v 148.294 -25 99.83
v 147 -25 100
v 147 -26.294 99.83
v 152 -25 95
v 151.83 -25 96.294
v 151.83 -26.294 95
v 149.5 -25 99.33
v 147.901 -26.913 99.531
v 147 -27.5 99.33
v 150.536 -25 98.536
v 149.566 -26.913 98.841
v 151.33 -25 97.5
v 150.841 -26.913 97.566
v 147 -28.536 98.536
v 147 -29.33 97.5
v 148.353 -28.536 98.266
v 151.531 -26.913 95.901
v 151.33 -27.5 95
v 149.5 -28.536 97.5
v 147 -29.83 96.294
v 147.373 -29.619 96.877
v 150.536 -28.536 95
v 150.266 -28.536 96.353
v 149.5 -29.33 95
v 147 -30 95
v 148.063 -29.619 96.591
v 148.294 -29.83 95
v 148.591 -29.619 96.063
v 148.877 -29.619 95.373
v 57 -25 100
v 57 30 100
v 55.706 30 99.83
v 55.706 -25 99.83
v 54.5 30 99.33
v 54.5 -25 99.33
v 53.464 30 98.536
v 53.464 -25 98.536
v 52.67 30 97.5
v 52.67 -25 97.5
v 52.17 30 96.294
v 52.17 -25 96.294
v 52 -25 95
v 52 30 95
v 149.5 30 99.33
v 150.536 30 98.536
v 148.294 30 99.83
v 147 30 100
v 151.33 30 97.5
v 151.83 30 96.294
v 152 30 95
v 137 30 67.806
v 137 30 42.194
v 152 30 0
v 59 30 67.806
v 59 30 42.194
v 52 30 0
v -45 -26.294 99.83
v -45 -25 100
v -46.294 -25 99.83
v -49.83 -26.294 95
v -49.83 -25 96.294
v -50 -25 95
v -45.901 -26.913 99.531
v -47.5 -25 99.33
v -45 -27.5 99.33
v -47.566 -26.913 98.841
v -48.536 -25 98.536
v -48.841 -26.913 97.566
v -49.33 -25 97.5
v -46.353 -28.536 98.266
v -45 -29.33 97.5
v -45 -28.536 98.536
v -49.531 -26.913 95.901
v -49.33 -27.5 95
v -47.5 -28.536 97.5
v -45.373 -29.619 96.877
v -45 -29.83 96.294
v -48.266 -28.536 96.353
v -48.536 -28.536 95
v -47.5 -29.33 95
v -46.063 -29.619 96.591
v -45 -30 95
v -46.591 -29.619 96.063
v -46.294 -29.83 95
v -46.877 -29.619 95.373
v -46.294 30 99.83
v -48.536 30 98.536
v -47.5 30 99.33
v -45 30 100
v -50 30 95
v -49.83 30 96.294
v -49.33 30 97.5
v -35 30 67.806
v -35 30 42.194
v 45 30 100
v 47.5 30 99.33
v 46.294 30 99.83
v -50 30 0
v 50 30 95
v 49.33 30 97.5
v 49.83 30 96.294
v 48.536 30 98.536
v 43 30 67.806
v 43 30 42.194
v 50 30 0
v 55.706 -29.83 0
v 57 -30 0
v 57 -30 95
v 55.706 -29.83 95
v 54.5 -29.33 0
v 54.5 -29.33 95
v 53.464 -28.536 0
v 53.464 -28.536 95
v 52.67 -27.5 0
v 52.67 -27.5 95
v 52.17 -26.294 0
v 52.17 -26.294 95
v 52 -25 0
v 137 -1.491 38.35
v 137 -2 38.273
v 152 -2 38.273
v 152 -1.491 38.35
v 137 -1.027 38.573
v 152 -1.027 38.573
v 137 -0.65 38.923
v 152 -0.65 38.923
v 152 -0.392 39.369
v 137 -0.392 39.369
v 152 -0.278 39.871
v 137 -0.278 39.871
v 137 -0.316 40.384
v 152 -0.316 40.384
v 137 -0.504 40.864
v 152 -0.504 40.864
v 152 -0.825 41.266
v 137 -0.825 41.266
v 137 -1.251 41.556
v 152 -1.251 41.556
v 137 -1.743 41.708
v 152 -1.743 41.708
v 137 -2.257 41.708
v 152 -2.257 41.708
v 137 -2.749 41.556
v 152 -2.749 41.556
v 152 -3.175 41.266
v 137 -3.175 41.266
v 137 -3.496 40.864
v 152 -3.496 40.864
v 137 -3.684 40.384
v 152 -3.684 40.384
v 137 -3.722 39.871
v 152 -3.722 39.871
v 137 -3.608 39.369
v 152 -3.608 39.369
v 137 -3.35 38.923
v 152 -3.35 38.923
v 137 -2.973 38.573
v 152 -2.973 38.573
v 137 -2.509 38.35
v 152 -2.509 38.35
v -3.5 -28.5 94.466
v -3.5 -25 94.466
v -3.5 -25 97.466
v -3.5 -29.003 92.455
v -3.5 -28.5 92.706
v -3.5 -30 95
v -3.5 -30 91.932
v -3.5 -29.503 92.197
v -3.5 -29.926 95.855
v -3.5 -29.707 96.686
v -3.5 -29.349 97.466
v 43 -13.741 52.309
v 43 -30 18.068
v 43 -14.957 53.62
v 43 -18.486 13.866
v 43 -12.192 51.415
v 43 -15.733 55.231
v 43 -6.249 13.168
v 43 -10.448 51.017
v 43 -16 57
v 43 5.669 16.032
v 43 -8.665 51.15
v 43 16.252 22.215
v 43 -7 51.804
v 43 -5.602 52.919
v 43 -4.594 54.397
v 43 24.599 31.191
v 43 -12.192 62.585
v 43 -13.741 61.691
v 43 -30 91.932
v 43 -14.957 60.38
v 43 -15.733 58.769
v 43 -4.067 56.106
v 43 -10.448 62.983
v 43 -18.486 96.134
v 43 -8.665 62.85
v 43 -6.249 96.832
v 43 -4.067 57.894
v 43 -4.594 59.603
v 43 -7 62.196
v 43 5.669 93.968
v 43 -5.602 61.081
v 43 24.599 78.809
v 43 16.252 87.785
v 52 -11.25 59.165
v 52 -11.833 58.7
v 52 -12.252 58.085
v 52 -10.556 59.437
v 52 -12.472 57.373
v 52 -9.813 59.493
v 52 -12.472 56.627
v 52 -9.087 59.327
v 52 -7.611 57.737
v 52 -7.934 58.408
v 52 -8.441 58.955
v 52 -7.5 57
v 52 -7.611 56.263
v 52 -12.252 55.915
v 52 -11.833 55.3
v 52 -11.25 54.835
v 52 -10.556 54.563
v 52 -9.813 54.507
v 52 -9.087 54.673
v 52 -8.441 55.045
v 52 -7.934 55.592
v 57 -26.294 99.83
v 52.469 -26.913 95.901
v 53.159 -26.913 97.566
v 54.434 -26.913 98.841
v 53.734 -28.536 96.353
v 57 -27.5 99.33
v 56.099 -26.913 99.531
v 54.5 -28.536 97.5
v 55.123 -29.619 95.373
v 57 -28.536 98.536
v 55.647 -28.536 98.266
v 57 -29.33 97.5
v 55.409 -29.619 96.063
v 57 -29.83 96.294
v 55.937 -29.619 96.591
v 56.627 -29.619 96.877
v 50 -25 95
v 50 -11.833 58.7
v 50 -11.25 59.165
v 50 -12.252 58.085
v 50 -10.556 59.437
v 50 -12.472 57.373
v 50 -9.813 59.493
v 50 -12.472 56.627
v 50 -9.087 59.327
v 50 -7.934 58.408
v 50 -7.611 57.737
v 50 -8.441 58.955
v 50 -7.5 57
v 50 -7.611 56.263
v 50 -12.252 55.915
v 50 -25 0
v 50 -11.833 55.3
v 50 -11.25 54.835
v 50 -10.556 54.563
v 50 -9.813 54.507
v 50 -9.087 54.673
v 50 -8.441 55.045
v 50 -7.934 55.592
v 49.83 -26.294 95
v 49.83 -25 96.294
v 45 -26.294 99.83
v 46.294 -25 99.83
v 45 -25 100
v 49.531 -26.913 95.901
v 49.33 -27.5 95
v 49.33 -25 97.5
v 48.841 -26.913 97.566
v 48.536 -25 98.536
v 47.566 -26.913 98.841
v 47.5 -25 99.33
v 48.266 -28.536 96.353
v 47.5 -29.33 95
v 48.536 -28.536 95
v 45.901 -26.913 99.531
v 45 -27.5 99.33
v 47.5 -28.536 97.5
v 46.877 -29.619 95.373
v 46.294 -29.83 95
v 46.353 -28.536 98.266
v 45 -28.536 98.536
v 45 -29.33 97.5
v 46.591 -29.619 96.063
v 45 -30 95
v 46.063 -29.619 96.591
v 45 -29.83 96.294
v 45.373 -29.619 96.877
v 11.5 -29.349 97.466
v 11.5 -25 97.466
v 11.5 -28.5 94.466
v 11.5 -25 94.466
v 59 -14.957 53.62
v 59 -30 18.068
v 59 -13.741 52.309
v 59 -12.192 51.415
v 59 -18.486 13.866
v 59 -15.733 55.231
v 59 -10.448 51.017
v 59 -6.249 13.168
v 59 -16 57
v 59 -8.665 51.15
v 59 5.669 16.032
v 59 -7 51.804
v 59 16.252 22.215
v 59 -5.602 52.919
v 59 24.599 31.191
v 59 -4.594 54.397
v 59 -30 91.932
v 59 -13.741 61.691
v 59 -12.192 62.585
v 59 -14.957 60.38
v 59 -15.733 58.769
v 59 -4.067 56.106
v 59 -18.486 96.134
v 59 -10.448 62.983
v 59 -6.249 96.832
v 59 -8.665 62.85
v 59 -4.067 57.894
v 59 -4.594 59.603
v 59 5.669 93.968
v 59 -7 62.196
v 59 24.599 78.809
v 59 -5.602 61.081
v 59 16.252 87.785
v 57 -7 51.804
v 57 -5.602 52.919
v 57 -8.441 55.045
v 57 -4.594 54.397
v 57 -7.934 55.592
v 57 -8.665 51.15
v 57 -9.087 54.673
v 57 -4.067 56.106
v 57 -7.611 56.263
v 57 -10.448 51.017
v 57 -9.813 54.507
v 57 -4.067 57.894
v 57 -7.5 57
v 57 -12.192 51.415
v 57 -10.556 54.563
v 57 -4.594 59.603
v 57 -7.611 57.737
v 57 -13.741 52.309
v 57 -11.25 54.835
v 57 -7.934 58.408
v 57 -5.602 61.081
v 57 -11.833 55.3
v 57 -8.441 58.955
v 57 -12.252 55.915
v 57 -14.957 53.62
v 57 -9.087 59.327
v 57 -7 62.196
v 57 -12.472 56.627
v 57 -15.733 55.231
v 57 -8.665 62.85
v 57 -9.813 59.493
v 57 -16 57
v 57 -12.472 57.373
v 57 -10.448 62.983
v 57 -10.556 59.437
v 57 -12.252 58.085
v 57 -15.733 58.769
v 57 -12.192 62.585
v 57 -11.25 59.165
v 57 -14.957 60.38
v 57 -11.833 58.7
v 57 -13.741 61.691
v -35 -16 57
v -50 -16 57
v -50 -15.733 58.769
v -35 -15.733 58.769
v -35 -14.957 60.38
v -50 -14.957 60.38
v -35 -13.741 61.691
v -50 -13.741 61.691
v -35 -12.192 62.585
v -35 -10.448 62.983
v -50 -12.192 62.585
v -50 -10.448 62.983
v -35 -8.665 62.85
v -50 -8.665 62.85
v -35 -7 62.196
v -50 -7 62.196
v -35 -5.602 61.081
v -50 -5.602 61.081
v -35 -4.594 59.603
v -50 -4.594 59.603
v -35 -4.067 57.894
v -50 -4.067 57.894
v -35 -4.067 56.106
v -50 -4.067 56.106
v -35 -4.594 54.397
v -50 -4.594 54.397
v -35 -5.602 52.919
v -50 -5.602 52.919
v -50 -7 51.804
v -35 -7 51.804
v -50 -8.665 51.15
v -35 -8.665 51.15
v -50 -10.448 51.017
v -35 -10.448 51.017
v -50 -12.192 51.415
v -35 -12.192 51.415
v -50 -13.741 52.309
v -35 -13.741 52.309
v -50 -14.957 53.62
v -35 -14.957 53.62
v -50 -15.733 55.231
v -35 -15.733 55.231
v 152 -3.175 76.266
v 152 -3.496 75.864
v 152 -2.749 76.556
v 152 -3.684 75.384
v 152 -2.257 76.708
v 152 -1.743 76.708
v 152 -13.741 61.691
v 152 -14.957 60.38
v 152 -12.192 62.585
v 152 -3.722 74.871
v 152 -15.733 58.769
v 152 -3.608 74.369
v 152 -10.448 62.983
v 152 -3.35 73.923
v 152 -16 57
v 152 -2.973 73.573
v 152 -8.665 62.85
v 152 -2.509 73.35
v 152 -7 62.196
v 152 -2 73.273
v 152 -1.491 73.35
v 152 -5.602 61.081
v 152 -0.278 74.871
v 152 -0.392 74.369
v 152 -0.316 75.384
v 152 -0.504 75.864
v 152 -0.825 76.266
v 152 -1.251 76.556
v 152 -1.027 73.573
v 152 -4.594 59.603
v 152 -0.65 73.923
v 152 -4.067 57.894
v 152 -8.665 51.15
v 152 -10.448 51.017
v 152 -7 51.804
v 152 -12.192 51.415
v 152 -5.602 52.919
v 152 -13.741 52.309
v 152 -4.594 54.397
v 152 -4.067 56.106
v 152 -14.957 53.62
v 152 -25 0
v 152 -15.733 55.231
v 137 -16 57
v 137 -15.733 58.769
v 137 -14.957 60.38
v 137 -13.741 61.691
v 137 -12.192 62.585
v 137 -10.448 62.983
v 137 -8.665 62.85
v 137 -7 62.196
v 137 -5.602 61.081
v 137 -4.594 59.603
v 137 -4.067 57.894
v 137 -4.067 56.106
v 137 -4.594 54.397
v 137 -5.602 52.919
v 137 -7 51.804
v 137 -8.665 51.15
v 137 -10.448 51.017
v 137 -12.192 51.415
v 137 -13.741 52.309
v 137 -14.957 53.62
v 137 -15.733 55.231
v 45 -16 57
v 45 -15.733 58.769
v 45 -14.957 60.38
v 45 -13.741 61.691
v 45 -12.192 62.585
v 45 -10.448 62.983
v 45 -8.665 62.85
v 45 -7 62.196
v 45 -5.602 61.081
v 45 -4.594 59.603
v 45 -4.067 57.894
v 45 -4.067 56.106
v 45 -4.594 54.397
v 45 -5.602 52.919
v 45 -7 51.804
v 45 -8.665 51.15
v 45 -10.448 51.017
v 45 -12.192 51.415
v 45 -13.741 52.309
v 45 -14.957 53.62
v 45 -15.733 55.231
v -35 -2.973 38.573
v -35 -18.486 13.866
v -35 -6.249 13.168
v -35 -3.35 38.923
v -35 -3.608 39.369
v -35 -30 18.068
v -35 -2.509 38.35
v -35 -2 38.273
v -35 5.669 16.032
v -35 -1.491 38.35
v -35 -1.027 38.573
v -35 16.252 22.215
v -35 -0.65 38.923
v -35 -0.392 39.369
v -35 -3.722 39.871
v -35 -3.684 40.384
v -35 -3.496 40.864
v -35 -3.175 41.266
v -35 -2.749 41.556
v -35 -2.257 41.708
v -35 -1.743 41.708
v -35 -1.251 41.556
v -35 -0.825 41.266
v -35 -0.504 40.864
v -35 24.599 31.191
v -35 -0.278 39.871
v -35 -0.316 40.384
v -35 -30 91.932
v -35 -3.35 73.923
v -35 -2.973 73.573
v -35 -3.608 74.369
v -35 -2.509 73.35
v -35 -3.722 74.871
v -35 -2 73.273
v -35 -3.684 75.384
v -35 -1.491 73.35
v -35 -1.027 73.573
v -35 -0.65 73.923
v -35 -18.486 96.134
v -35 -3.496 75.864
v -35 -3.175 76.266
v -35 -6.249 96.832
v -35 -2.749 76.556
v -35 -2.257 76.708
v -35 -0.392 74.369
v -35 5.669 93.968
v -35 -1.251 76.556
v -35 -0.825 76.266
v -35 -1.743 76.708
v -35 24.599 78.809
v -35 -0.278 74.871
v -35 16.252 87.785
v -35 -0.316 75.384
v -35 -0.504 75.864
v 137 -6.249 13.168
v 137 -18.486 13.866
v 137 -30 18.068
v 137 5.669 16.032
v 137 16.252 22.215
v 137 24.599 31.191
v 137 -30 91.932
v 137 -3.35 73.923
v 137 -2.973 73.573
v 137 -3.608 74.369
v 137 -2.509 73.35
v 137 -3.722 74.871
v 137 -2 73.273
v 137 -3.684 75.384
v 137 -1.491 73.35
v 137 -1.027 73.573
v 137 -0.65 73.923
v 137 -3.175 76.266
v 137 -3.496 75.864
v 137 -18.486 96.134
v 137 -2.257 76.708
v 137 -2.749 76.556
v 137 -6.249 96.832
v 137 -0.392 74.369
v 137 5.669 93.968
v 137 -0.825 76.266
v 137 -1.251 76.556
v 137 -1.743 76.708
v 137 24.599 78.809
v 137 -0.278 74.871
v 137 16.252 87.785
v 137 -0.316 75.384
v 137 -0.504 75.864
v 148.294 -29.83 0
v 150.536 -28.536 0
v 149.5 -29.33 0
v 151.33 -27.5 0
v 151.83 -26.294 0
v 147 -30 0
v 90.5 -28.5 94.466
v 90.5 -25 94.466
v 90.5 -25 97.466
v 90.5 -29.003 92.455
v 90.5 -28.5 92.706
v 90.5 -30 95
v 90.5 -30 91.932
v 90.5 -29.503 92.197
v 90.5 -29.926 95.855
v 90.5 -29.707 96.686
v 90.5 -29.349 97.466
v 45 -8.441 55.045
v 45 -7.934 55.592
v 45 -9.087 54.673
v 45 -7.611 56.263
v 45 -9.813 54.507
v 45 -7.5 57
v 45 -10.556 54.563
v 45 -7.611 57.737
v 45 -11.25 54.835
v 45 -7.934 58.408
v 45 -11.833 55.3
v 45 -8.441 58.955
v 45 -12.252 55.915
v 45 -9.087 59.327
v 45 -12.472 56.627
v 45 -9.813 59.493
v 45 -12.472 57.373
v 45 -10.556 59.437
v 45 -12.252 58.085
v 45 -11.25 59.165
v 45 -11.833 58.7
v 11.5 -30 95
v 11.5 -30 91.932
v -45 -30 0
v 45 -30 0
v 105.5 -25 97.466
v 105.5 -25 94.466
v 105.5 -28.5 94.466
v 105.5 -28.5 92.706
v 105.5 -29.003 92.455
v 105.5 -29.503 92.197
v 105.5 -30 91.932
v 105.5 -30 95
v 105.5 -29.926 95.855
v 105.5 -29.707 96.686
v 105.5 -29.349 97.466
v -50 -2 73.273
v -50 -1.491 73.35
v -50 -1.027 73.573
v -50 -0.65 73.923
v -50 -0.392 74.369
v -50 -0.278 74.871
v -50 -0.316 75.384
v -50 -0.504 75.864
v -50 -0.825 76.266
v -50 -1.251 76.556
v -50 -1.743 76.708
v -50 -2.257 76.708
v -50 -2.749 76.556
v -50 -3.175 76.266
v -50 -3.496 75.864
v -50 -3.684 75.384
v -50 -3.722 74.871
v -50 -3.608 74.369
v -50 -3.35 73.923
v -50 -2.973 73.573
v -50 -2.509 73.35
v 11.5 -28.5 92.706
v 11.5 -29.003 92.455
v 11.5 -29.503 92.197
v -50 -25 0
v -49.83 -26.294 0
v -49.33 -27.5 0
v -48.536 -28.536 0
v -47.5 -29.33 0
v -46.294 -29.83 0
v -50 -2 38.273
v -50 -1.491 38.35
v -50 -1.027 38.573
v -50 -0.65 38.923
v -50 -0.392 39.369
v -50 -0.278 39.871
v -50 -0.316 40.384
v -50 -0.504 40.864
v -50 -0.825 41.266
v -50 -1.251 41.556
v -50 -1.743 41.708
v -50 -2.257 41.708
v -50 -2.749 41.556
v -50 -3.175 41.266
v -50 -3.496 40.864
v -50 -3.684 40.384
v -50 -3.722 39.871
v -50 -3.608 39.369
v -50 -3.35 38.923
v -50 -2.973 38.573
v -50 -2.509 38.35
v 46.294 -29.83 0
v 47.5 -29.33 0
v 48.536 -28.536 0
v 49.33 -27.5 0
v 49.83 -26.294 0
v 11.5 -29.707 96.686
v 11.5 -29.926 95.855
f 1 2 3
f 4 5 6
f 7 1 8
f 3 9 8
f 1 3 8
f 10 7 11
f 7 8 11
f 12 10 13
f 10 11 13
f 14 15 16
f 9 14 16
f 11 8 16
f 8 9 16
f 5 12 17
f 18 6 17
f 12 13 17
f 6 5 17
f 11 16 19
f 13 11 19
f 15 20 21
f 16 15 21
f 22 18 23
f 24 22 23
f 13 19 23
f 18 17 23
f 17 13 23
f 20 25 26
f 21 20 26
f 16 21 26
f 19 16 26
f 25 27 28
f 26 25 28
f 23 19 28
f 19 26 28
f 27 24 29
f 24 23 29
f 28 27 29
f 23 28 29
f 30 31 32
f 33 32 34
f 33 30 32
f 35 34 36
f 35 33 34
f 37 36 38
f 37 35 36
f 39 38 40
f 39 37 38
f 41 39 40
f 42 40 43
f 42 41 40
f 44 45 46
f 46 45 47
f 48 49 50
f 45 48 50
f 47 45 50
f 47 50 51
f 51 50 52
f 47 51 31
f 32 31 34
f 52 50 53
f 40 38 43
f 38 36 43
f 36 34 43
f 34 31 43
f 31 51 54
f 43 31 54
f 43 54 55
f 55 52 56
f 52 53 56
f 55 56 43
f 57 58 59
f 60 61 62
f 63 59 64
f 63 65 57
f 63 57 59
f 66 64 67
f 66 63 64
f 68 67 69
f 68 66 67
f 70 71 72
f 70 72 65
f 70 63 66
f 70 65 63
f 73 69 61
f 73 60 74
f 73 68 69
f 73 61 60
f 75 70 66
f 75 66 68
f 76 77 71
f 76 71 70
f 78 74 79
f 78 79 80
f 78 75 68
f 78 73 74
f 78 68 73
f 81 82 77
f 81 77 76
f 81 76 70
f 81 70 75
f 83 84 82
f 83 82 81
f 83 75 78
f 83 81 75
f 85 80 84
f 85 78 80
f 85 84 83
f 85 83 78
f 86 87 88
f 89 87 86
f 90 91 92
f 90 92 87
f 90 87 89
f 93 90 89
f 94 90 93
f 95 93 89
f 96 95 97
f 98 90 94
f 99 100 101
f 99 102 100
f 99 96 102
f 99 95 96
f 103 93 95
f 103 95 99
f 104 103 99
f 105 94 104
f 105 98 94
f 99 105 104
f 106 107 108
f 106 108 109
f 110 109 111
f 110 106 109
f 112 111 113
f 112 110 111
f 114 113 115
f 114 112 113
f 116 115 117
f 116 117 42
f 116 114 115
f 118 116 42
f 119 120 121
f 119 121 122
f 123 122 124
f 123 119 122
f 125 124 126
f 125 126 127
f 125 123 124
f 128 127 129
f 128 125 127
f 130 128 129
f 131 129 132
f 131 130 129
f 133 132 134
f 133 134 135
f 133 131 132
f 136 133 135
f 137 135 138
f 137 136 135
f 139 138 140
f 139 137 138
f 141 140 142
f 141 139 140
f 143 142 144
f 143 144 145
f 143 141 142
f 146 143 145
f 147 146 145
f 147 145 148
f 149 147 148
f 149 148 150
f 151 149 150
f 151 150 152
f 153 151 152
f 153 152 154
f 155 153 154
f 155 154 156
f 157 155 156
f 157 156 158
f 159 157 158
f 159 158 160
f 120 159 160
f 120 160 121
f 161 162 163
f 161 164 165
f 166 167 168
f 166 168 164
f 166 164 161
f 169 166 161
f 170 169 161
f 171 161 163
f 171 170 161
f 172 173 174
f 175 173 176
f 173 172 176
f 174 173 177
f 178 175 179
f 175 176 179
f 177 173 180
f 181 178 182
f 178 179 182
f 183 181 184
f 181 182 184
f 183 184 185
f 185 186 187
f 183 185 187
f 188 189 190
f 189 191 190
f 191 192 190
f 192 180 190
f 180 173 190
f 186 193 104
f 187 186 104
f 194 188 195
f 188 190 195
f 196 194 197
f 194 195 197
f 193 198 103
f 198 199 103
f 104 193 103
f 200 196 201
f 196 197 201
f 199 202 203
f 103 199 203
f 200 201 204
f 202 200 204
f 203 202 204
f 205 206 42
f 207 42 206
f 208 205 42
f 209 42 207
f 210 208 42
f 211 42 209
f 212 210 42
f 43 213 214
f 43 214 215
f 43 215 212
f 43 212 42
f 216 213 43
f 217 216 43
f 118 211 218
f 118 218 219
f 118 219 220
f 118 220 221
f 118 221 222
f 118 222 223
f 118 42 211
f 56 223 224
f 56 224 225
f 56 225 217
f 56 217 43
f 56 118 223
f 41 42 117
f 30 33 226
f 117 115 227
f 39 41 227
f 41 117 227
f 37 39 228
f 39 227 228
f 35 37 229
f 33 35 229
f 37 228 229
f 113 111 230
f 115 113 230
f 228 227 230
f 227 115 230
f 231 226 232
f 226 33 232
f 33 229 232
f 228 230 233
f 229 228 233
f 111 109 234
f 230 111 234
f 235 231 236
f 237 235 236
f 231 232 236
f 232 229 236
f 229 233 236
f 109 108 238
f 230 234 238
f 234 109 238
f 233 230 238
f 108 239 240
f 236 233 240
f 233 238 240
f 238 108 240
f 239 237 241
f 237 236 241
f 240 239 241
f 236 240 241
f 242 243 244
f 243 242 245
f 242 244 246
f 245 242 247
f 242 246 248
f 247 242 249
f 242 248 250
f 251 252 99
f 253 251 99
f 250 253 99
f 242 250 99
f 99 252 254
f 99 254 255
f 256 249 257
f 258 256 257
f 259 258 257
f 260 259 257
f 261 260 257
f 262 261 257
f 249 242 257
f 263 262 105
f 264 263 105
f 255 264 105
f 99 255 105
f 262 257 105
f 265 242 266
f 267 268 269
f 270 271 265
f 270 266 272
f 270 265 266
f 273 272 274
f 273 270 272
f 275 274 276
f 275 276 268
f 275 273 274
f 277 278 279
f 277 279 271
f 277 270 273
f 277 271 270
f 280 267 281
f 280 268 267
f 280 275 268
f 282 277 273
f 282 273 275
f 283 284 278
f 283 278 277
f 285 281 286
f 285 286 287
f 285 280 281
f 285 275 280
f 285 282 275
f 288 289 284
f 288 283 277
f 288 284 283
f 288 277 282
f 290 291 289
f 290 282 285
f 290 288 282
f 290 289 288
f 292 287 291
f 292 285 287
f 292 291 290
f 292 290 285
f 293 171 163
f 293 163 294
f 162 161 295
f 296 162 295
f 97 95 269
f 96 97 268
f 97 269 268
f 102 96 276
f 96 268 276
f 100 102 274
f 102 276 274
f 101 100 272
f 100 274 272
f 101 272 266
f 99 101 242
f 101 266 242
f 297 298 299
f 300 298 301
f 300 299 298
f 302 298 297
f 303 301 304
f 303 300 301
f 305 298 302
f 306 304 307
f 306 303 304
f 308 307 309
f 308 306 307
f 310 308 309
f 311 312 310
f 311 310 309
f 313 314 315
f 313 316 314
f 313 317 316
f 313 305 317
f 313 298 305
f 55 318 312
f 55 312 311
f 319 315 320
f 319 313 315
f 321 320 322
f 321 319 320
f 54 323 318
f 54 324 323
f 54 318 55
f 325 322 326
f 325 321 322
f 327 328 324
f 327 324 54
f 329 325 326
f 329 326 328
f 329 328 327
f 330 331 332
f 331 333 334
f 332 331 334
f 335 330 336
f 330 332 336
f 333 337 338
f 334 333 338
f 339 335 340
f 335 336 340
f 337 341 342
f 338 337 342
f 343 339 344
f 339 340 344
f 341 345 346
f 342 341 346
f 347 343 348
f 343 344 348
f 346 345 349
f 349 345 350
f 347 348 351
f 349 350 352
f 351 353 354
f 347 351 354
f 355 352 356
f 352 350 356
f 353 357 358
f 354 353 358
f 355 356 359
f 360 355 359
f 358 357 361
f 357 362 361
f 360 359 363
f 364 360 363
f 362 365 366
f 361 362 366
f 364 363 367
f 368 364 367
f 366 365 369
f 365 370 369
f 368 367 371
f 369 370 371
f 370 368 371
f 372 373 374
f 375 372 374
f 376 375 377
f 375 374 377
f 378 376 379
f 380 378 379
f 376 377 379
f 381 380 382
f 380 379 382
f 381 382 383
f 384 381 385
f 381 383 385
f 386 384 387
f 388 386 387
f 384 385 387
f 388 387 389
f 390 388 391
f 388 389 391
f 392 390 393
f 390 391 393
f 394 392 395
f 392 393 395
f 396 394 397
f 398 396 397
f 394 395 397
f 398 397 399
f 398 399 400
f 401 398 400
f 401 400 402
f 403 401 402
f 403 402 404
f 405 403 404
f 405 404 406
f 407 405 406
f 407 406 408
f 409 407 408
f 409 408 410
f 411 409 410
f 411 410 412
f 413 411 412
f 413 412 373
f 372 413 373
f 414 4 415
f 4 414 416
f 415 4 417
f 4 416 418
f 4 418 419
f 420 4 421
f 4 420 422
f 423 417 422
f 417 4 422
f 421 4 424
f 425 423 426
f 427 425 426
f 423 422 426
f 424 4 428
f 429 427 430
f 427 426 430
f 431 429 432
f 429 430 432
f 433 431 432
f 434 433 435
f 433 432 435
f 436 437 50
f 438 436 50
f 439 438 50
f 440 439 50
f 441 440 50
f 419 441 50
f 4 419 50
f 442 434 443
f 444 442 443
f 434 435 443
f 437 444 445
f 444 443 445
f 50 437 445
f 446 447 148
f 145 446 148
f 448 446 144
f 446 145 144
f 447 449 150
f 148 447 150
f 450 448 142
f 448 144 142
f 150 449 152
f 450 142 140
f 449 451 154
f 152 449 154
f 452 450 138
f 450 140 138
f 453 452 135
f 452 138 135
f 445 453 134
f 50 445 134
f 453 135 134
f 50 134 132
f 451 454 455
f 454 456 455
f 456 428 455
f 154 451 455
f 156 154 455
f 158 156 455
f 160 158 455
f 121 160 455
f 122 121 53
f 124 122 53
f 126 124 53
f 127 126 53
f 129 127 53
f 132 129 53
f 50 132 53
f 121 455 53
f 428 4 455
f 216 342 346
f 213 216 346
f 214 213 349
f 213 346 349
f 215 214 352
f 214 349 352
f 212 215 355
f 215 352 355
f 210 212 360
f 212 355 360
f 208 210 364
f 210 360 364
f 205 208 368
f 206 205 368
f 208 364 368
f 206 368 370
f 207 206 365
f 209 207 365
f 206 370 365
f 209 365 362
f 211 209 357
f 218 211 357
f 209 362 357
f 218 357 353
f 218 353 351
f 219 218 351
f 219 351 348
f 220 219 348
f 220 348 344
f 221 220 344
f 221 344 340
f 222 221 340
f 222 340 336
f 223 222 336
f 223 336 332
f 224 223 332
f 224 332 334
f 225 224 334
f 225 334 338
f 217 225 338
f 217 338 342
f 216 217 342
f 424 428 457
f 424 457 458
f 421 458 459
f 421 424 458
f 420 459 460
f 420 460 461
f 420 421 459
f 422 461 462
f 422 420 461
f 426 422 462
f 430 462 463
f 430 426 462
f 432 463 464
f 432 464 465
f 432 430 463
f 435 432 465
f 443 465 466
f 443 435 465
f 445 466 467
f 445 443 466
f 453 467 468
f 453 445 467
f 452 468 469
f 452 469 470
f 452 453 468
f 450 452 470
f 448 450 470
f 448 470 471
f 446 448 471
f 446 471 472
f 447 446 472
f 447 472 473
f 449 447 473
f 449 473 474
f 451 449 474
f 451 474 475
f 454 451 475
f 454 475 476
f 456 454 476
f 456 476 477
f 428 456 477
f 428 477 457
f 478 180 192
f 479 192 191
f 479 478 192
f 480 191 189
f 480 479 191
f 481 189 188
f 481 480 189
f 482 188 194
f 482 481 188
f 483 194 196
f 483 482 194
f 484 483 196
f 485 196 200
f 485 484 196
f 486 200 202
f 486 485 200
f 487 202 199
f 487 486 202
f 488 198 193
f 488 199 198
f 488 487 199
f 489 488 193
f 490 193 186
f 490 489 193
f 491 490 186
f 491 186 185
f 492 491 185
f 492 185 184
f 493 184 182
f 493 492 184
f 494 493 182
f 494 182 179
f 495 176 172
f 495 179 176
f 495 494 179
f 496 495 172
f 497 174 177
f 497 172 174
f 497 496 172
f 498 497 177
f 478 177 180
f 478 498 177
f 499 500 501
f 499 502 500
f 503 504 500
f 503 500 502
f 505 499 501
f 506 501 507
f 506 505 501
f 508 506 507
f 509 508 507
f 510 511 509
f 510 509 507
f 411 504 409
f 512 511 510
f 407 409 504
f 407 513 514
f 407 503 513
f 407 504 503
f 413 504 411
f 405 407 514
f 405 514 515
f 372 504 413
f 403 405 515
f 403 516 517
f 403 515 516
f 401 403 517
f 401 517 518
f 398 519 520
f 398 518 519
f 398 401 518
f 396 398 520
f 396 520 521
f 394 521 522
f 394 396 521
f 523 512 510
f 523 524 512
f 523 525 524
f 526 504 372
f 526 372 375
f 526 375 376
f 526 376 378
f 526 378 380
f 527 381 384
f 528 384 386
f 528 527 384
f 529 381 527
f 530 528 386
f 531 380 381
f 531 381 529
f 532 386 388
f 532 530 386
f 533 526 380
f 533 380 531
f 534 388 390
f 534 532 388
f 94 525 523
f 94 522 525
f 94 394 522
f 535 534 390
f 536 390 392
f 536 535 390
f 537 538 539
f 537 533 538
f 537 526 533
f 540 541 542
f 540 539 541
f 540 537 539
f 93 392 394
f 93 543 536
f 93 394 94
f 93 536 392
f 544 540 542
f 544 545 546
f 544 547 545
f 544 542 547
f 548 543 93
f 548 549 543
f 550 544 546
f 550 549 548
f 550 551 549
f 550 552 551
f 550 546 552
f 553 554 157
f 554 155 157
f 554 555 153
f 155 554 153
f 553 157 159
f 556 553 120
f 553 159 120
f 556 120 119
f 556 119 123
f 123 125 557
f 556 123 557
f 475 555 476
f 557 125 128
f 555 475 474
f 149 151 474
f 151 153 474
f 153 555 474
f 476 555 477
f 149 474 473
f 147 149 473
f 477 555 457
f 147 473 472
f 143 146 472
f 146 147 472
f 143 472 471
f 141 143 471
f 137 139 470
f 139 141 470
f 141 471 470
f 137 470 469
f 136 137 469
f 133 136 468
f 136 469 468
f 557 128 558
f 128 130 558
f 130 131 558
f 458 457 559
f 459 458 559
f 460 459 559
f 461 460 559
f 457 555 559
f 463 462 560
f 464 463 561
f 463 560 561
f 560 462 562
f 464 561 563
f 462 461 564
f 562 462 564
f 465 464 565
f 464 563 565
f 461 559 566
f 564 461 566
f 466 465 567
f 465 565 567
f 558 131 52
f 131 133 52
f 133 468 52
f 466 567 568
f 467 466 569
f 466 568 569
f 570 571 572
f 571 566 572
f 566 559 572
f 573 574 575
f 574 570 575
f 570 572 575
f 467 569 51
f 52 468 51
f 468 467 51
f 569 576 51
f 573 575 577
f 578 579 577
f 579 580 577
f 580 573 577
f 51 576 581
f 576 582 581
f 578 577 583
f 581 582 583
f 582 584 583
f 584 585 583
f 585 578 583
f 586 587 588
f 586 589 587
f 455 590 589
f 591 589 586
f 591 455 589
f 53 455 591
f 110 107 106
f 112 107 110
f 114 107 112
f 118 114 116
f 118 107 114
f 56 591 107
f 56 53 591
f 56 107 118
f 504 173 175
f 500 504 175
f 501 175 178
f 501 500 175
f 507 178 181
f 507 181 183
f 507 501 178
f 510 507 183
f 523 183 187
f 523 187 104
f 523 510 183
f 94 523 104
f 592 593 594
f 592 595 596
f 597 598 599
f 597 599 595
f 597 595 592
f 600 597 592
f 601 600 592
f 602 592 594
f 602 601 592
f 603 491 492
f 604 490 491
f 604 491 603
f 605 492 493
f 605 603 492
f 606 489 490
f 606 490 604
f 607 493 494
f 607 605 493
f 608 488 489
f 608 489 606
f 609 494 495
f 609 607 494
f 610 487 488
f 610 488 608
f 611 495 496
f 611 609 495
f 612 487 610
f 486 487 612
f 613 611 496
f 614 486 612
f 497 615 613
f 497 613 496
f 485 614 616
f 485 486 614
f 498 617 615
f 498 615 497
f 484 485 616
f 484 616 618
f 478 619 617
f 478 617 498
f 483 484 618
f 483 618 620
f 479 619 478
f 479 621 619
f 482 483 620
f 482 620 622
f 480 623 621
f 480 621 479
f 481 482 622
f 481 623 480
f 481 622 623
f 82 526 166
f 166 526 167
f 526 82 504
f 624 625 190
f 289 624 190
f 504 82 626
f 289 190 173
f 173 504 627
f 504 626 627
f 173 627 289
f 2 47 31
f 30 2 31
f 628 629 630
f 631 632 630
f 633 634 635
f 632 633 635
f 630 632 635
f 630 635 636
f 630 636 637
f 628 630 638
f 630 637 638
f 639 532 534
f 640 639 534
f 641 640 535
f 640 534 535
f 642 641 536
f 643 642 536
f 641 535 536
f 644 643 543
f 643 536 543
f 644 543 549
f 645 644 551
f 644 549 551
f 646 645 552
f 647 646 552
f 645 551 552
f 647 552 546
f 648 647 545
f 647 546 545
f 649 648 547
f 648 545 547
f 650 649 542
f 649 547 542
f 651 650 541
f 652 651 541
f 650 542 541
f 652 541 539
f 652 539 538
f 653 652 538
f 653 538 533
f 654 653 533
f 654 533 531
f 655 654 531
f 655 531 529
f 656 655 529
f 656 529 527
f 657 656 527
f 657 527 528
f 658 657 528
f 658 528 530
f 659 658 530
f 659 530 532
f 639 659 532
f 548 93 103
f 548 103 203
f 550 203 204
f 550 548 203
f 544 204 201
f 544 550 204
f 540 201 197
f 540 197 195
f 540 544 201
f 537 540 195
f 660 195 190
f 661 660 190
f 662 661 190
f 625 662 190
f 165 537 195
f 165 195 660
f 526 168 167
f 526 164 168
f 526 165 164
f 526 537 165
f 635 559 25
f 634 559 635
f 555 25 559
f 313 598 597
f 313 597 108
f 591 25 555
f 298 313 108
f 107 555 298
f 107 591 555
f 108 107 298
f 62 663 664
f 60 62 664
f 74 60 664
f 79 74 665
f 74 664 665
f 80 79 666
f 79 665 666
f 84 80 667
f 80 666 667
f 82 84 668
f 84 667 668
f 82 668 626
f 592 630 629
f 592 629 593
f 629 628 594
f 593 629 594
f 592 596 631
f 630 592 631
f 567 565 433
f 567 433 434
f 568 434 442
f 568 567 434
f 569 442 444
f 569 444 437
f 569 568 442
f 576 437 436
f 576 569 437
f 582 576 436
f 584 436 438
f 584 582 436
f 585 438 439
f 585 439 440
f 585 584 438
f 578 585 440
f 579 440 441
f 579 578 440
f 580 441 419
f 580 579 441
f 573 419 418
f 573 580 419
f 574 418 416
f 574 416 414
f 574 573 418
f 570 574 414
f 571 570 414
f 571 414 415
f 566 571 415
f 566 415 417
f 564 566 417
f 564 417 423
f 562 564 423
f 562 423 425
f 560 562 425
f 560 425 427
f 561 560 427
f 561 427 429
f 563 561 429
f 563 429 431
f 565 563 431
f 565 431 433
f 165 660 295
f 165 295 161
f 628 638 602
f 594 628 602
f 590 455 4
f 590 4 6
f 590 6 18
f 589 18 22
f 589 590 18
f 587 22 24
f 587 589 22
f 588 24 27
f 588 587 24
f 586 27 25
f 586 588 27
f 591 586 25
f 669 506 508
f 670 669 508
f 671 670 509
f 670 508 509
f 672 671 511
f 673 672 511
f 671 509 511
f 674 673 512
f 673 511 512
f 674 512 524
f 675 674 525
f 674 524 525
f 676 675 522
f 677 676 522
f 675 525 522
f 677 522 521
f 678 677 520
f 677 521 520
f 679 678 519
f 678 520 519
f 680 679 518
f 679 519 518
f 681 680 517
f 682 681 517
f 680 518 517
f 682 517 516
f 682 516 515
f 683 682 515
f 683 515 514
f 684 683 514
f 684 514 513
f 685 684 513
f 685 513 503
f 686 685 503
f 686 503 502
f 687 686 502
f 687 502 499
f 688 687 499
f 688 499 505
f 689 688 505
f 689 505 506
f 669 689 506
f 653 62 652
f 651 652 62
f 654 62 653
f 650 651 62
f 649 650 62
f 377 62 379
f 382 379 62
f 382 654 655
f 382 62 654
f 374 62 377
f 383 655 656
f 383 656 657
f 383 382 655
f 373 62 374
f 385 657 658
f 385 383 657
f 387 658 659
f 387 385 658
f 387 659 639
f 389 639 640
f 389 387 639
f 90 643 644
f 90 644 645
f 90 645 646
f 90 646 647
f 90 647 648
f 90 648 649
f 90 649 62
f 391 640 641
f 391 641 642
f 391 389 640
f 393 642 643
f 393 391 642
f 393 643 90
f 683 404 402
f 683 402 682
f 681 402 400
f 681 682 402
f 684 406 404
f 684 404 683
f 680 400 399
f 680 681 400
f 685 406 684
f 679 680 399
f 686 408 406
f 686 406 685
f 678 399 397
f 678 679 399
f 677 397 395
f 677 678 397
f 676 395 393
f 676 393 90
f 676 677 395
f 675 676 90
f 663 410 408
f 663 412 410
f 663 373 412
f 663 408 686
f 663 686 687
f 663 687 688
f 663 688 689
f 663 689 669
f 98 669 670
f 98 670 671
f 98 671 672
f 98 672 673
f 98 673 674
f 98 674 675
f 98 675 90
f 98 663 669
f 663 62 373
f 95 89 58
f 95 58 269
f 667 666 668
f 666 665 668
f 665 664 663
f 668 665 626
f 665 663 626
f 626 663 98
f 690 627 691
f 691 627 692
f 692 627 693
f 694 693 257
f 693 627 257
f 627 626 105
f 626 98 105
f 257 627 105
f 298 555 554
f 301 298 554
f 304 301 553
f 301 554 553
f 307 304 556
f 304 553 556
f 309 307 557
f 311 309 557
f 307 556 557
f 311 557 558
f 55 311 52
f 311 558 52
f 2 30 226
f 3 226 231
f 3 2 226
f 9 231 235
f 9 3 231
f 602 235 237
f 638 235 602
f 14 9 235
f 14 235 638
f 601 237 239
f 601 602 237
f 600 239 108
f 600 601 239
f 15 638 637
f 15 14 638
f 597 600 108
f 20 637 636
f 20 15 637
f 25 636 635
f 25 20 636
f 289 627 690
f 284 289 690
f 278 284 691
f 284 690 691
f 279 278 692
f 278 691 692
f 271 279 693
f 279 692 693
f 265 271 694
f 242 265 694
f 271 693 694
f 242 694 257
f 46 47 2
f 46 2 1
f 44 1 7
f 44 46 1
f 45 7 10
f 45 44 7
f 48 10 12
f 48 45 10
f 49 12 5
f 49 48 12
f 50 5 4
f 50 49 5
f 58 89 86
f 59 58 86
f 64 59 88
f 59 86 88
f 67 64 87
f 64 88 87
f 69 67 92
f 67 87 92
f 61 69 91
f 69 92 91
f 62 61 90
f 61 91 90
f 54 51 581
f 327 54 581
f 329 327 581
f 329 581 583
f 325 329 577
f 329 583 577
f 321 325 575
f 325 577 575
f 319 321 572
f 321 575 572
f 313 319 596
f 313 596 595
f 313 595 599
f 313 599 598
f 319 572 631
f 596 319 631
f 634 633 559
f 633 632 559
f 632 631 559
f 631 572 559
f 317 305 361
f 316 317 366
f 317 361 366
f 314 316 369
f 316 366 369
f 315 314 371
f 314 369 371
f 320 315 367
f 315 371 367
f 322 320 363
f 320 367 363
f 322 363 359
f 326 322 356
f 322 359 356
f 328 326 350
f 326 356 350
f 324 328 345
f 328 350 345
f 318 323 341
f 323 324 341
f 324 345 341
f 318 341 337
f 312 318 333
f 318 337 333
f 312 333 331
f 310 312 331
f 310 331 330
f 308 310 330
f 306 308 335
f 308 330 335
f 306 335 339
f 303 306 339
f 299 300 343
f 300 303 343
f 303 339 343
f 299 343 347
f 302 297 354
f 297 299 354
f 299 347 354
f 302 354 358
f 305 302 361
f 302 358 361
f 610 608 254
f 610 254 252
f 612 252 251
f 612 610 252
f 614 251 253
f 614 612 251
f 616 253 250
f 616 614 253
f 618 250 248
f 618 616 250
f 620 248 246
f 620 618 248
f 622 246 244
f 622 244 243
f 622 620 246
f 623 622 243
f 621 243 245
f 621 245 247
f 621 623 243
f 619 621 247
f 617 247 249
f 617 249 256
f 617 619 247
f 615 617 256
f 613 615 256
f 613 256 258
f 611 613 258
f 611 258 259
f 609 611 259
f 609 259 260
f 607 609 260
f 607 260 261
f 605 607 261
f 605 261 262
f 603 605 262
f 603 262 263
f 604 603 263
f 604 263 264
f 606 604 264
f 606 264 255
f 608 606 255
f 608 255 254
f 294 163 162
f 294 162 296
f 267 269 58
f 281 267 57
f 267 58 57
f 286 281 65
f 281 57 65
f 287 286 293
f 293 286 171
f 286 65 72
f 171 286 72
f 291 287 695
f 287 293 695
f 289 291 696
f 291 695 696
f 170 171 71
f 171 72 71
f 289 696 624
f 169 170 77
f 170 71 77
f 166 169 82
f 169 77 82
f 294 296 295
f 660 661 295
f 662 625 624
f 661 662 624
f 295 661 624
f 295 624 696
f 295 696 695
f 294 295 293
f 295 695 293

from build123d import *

# Parameters (mm, degrees)
SKETCH1_W                     = 100
SKETCH1_H                     = 60
BOSS_EXTRUDE1_DEPTH           = 100
CUT_EXTRUDE3_START            = -35
CUT_EXTRUDE3_DEPTH            = 78
CUT_EXTRUDE4_START            = -50
CUT_EXTRUDE4_OUTLINE_R        = 2.5
CUT_EXTRUDE4_DEPTH            = 100
CUT_EXTRUDE5_REACH            = 146.568
SKETCH3_R                     = 6
TAP_DRILL_FOR_8_32_TAP1_D     = 3.4544
TAP_DRILL_FOR_8_32_TAP1_DEPTH = 20
TAP_DRILL_FOR_8_32_TAP1_TIP   = 1.037806461
CUT_EXTRUDE6_DEPTH            = 80
CUT_EXTRUDE6_DEPTH_BACK       = 2
SKETCH7_R                     = 6
SKETCH8_W                     = 15
SKETCH8_H                     = 3
CUT_EXTRUDE7_DEPTH            = 5
SKETCH9_W                     = 15
SKETCH9_H                     = 2.533814688
CUT_EXTRUDE8_DEPTH            = 1.5
FILLET1_R                     = 5


# Read off the part's stored shape, not the designer's step: Cut-Extrude3, Cut-Extrude4
with BuildPart() as part:
    # Sketch1 → Boss-Extrude1 (new body)
    with BuildSketch(Plane.XY):
        Rectangle(SKETCH1_W, SKETCH1_H)
    extrude(amount=BOSS_EXTRUDE1_DEPTH)

    # Cut-Extrude3 outline → Cut-Extrude3 (cut)
    with BuildSketch(Plane.YZ.offset(CUT_EXTRUDE3_START)):
        with BuildLine():
            Line((30, 42.193751525), (30, 67.806248475))
            ThreePointArc((30, 67.806248475), (5.668996219, 93.96771173), (-30, 91.932370625))
            Line((-30, 91.932370625), (-30, 18.067629375))
            ThreePointArc((-30, 18.067629375), (5.668996219, 16.03228827), (30, 42.193751525))
        make_face()
    extrude(amount=CUT_EXTRUDE3_DEPTH, mode=Mode.SUBTRACT)

    # Cut-Extrude4 outline → Cut-Extrude4 (cut)
    with BuildSketch(Plane.YZ.offset(CUT_EXTRUDE4_START)):
        with Locations((-10, 57)):
            Circle(CUT_EXTRUDE4_OUTLINE_R)
    extrude(amount=CUT_EXTRUDE4_DEPTH, mode=Mode.SUBTRACT)

    # Sketch3 → Cut-Extrude5 (cut, up to next)
    with BuildSketch(Plane.ZY.offset(50), mode=Mode.PRIVATE) as cut_extrude5_sk1:
        with Locations(Location((57, -10, 0), (0, 0, 270))):
            Circle(SKETCH3_R)
    cut_extrude5_tool1 = extrude(cut_extrude5_sk1.sketch, amount=-CUT_EXTRUDE5_REACH, mode=Mode.PRIVATE) & part.part
    add(cut_extrude5_tool1.solids().sort_by_distance((-50, -10, 57))[0], mode=Mode.SUBTRACT)

    # Tap Drill for #8-32 Tap1
    with Locations(Plane.ZY.offset(50)):
        with Locations((75, -2), (40, -2)):
            Hole(TAP_DRILL_FOR_8_32_TAP1_D / 2, depth=TAP_DRILL_FOR_8_32_TAP1_DEPTH)
            with Locations((0, 0, -(TAP_DRILL_FOR_8_32_TAP1_DEPTH + TAP_DRILL_FOR_8_32_TAP1_TIP / 2))):  # 118° drill point
                Cone(0, TAP_DRILL_FOR_8_32_TAP1_D / 2, TAP_DRILL_FOR_8_32_TAP1_TIP, mode=Mode.SUBTRACT)

    # Sketch7 → Cut-Extrude6 (cut, two sides: drawn at the far end of the back side and taken through both)
    with BuildSketch(Plane.ZY.offset(-43).offset(-CUT_EXTRUDE6_DEPTH_BACK)):
        with Locations(Location((57, -10, 0), (0, 0, 270))):
            Circle(SKETCH7_R)
    extrude(amount=CUT_EXTRUDE6_DEPTH + CUT_EXTRUDE6_DEPTH_BACK, mode=Mode.SUBTRACT)

    # Sketch8 → Cut-Extrude7 (cut)
    with BuildSketch(Plane.XZ.offset(30)):
        with Locations((4, 95.966185313)):
            Rectangle(SKETCH8_W, SKETCH8_H)
    extrude(amount=-CUT_EXTRUDE7_DEPTH, mode=Mode.SUBTRACT)

    # Sketch9 → Cut-Extrude8 (cut)
    with BuildSketch(Plane(origin=(0, -30, 0), x_dir=(-1, 0, 0), z_dir=(0, -1, 0))):
        with Locations((-4, -93.199277969)):
            Rectangle(SKETCH9_W, SKETCH9_H)
    extrude(amount=-CUT_EXTRUDE8_DEPTH, mode=Mode.SUBTRACT)

    # Fillet1
    # the kernel refuses this fillet: 5 mm, written as the material it takes off along each edge
    with BuildSketch(Plane(origin=(-45, -25, 95), x_dir=(0, 0, 1), z_dir=(0, -1, 0))) as fillet1_piece_1_section:
        Polygon((0, 0), (FILLET1_R, 0), (FILLET1_R, FILLET1_R), (0, FILLET1_R), align=None)
    fillet1_piece_1 = extrude(amount=FILLET1_R, mode=Mode.PRIVATE)
    fillet1_piece_1 = fillet1_piece_1 - Plane(origin=(-45, -25, 95), x_dir=(0.7071067811865475, 0, -0.7071067811865475), z_dir=(0, -1, 0)) * Sphere(FILLET1_R, mode=Mode.PRIVATE)
    add(fillet1_piece_1, mode=Mode.SUBTRACT)
    with BuildSketch(Plane(origin=(45, -25, 95), x_dir=(1, 0, 0), z_dir=(0, -1, 0))) as fillet1_piece_2_section:
        Polygon((0, 0), (FILLET1_R, 0), (FILLET1_R, FILLET1_R), (0, FILLET1_R), align=None)
    fillet1_piece_2 = extrude(amount=FILLET1_R, mode=Mode.PRIVATE)
    fillet1_piece_2 = fillet1_piece_2 - Plane(origin=(45, -25, 95), x_dir=(-0.7071067811865475, 0, -0.7071067811865475), z_dir=(0, -1, 0)) * Sphere(FILLET1_R, mode=Mode.PRIVATE)
    add(fillet1_piece_2, mode=Mode.SUBTRACT)
    with BuildSketch(Plane(origin=(-45, -30, 100), x_dir=(0, 0, -1), z_dir=(1, 0, 0))) as fillet1_piece_3:
        with BuildLine():
            CenterArc((FILLET1_R, FILLET1_R), FILLET1_R, 180, 90)
            Line((0, FILLET1_R), (0, 0))
            Line((0, 0), (FILLET1_R, 0))
        make_face()
    extrude(amount=90, mode=Mode.SUBTRACT)
    with BuildSketch(Plane(origin=(50, -30, -12.5), x_dir=(-1, 0, 0), z_dir=(0, 0, 1))) as fillet1_piece_4:
        with BuildLine():
            CenterArc((FILLET1_R, -FILLET1_R), FILLET1_R, 90, 90)
            Line((0, -FILLET1_R), (0, 0))
            Line((0, 0), (FILLET1_R, 0))
        make_face()
    extrude(amount=107.5, mode=Mode.SUBTRACT)
    with BuildSketch(Plane(origin=(-50, -30, -12.5), x_dir=(1, 0, 0), z_dir=(0, 0, 1))) as fillet1_piece_5:
        with BuildLine():
            CenterArc((FILLET1_R, FILLET1_R), FILLET1_R, 180, 90)
            Line((0, FILLET1_R), (0, 0))
            Line((0, 0), (FILLET1_R, 0))
        make_face()
    extrude(amount=107.5, mode=Mode.SUBTRACT)
    with BuildSketch(Plane(origin=(50, -25, 100), x_dir=(0, 0, -1), z_dir=(0, 1, 0))) as fillet1_piece_6:
        with BuildLine():
            CenterArc((FILLET1_R, FILLET1_R), FILLET1_R, 180, 90)
            Line((0, FILLET1_R), (0, 0))
            Line((0, 0), (FILLET1_R, 0))
        make_face()
    extrude(amount=67.5, mode=Mode.SUBTRACT)
    with BuildSketch(Plane(origin=(-50, 42.5, 100), x_dir=(1, 0, 0), z_dir=(0, -1, 0))) as fillet1_piece_7:
        with BuildLine():
            CenterArc((FILLET1_R, -FILLET1_R), FILLET1_R, 90, 90)
            Line((0, -FILLET1_R), (0, 0))
            Line((0, 0), (FILLET1_R, 0))
        make_face()
    extrude(amount=67.5, mode=Mode.SUBTRACT)


with BuildPart() as body_2:
    # Mirror5: mirrored copy
    add(part.part.mirror(Plane(origin=(51, 0, 0), x_dir=(0, 0, 1), z_dir=(1, 0, 0))))


solid = Compound([part.part, body_2.part])
